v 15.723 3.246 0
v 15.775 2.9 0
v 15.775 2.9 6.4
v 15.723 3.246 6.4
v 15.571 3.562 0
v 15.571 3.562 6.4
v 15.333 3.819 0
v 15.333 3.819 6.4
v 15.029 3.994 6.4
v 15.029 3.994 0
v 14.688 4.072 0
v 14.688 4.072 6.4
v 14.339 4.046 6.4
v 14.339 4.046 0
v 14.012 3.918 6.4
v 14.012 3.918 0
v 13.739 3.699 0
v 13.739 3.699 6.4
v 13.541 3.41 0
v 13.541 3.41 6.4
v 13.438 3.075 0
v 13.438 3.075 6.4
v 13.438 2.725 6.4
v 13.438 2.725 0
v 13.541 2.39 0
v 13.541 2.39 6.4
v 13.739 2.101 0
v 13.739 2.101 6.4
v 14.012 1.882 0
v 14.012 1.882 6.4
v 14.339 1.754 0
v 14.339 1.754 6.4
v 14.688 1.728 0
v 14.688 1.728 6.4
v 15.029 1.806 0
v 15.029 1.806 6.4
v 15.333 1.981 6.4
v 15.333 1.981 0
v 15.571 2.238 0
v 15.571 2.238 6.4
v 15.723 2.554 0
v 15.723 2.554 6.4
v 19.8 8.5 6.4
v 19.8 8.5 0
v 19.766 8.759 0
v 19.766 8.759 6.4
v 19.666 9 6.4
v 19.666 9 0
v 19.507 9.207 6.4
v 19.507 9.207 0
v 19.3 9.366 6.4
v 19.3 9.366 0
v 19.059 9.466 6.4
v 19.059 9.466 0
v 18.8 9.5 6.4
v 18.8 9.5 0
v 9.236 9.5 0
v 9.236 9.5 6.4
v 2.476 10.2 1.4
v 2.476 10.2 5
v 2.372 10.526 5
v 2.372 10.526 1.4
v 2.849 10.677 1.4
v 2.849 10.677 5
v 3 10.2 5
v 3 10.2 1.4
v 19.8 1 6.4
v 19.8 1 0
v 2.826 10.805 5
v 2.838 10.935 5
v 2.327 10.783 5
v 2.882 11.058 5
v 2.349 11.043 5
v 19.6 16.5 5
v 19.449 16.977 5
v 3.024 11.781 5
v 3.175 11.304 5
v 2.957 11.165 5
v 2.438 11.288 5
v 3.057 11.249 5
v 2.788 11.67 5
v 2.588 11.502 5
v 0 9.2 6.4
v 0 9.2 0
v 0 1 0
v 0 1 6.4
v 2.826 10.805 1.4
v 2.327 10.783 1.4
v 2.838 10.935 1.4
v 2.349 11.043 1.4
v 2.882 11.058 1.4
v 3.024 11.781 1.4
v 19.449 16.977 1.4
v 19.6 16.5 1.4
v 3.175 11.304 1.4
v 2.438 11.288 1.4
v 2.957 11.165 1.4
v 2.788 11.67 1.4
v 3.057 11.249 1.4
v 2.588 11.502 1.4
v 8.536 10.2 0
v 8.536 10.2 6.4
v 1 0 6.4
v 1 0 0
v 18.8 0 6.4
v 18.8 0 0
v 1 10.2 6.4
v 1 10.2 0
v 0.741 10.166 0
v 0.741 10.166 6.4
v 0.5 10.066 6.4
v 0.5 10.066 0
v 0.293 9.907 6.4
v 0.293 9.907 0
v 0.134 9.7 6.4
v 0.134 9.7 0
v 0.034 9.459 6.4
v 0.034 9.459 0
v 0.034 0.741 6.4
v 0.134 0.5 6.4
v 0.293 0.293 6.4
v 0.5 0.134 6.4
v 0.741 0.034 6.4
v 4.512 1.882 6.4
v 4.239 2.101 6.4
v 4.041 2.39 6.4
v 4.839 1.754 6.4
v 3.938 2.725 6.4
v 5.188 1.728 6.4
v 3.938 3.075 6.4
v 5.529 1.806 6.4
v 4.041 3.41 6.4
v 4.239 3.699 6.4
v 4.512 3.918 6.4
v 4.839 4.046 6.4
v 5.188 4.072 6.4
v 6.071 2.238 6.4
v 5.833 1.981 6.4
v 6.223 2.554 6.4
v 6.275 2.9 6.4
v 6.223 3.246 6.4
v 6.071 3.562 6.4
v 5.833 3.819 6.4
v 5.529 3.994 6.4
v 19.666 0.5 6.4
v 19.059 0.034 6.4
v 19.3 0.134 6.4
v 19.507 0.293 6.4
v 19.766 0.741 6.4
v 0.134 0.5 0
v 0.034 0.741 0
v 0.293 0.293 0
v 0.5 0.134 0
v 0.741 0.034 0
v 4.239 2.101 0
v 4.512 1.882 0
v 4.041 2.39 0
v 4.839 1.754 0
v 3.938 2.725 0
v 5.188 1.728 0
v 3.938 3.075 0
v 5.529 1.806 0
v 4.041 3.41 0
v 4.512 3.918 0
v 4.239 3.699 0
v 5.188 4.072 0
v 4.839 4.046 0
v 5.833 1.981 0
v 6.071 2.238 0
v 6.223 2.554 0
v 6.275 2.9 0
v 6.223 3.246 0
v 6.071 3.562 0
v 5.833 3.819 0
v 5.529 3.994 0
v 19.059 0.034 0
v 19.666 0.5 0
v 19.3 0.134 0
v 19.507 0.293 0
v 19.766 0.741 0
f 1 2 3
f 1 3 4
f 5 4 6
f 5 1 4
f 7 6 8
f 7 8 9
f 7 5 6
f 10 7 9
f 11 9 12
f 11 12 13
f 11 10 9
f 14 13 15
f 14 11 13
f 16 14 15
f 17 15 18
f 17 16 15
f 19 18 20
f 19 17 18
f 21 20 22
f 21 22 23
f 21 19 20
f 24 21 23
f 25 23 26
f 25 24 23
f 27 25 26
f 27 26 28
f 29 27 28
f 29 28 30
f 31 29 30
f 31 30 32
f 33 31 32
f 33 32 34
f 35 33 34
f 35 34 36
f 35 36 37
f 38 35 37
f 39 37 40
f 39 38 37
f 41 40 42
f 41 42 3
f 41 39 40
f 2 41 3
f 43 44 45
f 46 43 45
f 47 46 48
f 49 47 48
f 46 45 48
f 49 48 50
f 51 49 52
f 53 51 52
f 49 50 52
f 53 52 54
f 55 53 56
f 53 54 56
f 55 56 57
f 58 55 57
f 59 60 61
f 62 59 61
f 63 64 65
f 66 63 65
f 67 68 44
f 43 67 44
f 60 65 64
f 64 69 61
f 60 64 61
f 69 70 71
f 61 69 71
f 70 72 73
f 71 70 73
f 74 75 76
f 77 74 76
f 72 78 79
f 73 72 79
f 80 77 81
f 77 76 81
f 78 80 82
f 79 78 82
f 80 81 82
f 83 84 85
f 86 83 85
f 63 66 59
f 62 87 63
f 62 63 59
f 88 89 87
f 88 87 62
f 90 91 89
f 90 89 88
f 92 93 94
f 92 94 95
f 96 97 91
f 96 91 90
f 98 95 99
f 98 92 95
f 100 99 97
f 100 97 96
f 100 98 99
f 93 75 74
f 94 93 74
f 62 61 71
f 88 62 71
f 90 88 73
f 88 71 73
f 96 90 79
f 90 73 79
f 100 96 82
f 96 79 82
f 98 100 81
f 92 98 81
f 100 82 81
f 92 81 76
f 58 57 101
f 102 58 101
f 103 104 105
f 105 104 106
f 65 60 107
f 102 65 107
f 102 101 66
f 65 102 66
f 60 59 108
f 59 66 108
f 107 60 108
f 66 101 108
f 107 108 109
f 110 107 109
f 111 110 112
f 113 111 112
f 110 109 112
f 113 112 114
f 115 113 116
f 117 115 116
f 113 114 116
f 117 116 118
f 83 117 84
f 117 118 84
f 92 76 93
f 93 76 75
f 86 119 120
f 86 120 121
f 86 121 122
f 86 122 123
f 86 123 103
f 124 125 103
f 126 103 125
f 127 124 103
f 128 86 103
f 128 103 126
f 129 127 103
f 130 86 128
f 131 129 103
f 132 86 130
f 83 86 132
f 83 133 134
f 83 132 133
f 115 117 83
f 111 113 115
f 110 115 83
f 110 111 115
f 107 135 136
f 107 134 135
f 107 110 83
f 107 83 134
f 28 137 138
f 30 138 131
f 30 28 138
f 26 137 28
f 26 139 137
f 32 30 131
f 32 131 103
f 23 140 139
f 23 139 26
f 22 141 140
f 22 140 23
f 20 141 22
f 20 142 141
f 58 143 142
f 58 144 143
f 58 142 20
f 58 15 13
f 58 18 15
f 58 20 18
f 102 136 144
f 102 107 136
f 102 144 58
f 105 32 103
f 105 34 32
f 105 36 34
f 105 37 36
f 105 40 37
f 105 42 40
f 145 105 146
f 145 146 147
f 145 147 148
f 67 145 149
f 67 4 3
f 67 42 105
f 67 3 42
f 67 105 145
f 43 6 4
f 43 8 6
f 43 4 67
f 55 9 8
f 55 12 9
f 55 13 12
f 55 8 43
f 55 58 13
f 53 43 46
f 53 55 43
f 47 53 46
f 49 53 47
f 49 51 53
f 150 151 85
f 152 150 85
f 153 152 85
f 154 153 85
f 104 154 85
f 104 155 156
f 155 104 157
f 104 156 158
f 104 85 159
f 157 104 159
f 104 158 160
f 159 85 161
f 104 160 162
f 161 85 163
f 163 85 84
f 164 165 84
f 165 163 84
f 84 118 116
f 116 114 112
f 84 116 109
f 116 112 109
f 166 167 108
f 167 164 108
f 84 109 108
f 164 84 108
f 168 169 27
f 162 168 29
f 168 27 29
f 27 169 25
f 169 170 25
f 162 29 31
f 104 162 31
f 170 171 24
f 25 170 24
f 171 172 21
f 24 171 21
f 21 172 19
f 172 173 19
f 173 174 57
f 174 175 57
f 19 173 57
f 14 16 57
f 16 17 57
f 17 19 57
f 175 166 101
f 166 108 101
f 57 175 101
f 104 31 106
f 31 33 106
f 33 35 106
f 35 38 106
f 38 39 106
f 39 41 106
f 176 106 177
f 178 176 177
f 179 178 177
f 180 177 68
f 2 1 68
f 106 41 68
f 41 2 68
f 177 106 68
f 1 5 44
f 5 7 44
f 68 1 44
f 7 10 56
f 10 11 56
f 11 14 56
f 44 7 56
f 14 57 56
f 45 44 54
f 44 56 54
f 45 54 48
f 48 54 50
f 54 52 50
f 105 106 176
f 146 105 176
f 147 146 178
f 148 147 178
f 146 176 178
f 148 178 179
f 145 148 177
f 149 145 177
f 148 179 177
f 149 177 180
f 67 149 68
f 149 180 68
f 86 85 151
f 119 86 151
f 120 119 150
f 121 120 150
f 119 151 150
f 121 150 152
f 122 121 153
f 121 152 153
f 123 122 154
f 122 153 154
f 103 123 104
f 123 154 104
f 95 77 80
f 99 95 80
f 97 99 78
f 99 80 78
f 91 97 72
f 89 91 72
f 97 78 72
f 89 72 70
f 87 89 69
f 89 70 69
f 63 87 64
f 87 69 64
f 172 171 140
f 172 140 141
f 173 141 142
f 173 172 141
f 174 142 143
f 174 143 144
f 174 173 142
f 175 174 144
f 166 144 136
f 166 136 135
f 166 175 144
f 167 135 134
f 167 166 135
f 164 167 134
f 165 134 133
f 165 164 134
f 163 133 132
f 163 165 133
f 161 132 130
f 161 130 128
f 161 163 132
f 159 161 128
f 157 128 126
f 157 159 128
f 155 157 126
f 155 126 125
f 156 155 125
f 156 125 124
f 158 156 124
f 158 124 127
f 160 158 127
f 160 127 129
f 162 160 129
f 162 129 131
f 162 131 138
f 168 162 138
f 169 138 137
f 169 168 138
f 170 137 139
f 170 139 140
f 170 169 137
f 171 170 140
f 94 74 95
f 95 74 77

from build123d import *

# Parameters (mm, degrees)
ESQUISSE1_R        = 1.175
BOSS_EXTRU_1_DEPTH = 6.4
BOSS_EXTRU_2_DEPTH = 3.6


with BuildPart() as part:
    # Esquisse1 → Boss.-Extru.1 (new body)
    with BuildSketch(Plane.XY):
        with BuildLine():
            Line((1, 0), (18.8, 0))
            ThreePointArc((18.8, 0), (19.507106781, 0.292893219), (19.8, 1))
            Line((19.8, 1), (19.8, 8.5))
            ThreePointArc((19.8, 8.5), (19.507106781, 9.207106781), (18.8, 9.5))
            Line((18.8, 9.5), (9.235956187, 9.5))
            Line((9.235956187, 9.5), (8.535956187, 10.2))
            Line((8.535956187, 10.2), (1, 10.2))
            ThreePointArc((1, 10.2), (0.292893219, 9.907106781), (0, 9.2))
            Line((0, 9.2), (0, 1))
            ThreePointArc((0, 1), (0.292893219, 0.292893219), (1, 0))
        make_face()
        with Locations((5.1, 2.9)):
            Circle(ESQUISSE1_R, mode=Mode.SUBTRACT)
        with Locations((14.6, 2.9)):
            Circle(ESQUISSE1_R, mode=Mode.SUBTRACT)
    extrude(amount=BOSS_EXTRU_1_DEPTH)

    # Esquisse2 → Boss.-Extru.2 (add)
    with BuildSketch(Plane.XY.offset(5)):
        with BuildLine():
            Line((2.475579427, 10.2), (2.372481297, 10.525914526))
            ThreePointArc((2.372481297, 10.525914526), (2.438469066, 11.288431445), (3.024310349, 11.780951931))
            Line((3.024310349, 11.780951931), (19.449197912, 16.976716614))
            Line((19.449197912, 16.976716614), (19.6, 16.5))
            Line((19.6, 16.5), (3.175112437, 11.304235317))
            ThreePointArc((3.175112437, 11.304235317), (2.882191796, 11.057975074), (2.849197912, 10.676716614))
            Line((2.849197912, 10.676716614), (3, 10.2))
            Line((3, 10.2), (2.475579427, 10.2))
        make_face()
    extrude(amount=-BOSS_EXTRU_2_DEPTH)


solid = part.part
